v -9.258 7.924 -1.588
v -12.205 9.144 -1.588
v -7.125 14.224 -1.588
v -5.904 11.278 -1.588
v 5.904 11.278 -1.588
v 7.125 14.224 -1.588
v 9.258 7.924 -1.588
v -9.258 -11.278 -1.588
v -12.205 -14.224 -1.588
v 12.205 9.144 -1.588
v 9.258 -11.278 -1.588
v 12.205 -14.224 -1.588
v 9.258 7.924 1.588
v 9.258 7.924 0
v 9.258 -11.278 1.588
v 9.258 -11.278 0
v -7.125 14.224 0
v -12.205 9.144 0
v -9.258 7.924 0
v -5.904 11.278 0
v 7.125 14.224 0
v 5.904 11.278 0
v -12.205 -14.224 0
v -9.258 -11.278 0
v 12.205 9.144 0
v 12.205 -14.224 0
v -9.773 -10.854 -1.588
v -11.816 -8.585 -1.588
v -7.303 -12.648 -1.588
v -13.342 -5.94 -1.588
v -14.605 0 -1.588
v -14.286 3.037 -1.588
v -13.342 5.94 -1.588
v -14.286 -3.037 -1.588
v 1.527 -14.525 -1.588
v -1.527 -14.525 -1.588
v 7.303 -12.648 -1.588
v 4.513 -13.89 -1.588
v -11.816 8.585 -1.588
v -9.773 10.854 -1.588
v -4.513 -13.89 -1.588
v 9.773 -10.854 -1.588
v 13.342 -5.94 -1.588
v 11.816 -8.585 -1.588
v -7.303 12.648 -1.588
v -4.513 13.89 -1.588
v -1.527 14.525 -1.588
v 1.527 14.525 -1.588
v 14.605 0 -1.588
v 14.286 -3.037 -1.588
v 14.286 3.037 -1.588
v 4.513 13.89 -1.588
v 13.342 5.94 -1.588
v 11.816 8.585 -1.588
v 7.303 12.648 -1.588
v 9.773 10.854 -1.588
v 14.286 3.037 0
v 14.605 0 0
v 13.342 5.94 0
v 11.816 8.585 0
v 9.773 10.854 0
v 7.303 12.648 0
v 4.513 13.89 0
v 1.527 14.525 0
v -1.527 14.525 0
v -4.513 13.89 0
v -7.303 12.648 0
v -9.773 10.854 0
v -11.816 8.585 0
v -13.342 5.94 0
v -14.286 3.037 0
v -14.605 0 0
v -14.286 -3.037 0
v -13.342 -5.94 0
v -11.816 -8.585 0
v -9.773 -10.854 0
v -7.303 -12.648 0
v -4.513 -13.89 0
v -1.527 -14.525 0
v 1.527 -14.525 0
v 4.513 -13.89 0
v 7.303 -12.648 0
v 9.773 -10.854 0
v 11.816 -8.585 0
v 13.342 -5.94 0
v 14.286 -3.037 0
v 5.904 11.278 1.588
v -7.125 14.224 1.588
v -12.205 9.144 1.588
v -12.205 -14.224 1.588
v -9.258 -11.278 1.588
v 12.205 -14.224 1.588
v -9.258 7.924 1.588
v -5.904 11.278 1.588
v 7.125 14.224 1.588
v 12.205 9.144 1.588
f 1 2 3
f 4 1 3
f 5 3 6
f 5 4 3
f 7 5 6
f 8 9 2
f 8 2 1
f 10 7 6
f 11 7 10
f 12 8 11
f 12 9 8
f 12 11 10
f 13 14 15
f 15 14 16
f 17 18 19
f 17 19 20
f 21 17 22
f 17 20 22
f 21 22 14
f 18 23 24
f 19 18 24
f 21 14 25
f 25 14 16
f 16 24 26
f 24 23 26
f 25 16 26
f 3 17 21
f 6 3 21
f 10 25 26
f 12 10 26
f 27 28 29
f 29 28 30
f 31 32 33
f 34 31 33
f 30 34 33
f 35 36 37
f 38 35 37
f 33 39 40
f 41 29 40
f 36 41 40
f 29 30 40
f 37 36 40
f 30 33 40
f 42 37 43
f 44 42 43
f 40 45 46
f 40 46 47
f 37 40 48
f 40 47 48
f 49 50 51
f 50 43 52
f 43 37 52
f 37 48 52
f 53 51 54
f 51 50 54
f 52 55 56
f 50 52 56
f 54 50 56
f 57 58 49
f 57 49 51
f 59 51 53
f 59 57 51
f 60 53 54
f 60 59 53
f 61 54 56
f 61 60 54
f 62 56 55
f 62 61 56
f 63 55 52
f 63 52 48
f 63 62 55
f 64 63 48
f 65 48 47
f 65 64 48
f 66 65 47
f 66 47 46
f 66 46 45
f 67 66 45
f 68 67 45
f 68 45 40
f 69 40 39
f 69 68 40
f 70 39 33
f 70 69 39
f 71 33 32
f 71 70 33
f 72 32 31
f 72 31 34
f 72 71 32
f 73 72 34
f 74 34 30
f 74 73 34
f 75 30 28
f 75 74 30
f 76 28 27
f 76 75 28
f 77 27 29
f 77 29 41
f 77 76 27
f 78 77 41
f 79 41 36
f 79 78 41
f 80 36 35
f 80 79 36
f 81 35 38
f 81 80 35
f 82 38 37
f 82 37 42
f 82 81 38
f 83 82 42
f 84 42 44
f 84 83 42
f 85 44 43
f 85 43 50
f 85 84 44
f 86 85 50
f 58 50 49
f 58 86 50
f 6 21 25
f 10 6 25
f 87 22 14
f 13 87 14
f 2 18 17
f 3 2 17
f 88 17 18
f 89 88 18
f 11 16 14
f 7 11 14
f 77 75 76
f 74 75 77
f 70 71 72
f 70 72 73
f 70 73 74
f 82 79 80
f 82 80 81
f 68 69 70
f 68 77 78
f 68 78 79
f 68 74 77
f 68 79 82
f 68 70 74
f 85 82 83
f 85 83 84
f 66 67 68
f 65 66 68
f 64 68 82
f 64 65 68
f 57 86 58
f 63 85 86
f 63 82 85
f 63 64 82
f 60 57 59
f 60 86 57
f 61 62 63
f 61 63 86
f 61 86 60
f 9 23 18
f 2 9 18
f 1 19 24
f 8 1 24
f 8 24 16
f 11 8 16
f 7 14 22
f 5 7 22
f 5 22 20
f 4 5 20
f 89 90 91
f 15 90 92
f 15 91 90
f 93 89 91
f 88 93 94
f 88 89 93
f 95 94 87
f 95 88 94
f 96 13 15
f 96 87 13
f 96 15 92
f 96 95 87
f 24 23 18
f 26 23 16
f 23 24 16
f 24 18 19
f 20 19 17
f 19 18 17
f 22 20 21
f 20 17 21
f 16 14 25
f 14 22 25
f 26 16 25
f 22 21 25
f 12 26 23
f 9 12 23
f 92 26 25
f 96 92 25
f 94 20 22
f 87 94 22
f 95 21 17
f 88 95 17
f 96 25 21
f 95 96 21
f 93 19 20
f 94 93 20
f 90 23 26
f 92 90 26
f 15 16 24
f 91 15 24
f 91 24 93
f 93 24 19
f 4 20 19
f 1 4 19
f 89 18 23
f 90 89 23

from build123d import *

# Parameters (mm, degrees)
F1_DEPTH = 1.5875
F2_R     = 14.605
F3_DEPTH = 1.5875
F4_DEPTH = 1.5875


with BuildPart() as f1:
    # F0 (on Top) → F1 (new body)
    with BuildSketch(Plane.XY):
        Polygon((-12.2047, -14.224), (12.2047, -14.224), (12.2047, 9.144), (7.1247, 14.224), (-7.1247, 14.224), (-12.2047, 9.144), align=None)
        Polygon((9.2583, -11.2776), (-9.2583, -11.2776), (-9.2583, 7.923561), (-5.904261, 11.2776), (5.904261, 11.2776), (9.2583, 7.923561), align=None, mode=Mode.SUBTRACT)
    extrude(amount=F1_DEPTH)


with BuildPart() as f3:
    # F2 (on Top) → F3 (new body)
    with BuildSketch(Plane.XY):
        Circle(F2_R)
    extrude(amount=-F3_DEPTH)


with BuildPart() as f4:
    # F1_face (on face) → F4 (new body, through all)
    with BuildSketch(Plane(origin=(0, -0.79742, 0), x_dir=(1, 0, 0), z_dir=(0, 0, -1))):
        Polygon((-12.2047, 13.42658), (-12.2047, -9.94142), (-7.1247, -15.02142), (7.1247, -15.02142), (12.2047, -9.94142), (12.2047, 13.42658), align=None)
        Polygon((-9.2583, 10.48018), (9.2583, 10.48018), (9.2583, -8.720981), (5.904261, -12.07502), (-5.904261, -12.07502), (-9.2583, -8.720981), align=None, mode=Mode.SUBTRACT)
    extrude(amount=F4_DEPTH)


solid = Compound([f1.part, f3.part, f4.part])
